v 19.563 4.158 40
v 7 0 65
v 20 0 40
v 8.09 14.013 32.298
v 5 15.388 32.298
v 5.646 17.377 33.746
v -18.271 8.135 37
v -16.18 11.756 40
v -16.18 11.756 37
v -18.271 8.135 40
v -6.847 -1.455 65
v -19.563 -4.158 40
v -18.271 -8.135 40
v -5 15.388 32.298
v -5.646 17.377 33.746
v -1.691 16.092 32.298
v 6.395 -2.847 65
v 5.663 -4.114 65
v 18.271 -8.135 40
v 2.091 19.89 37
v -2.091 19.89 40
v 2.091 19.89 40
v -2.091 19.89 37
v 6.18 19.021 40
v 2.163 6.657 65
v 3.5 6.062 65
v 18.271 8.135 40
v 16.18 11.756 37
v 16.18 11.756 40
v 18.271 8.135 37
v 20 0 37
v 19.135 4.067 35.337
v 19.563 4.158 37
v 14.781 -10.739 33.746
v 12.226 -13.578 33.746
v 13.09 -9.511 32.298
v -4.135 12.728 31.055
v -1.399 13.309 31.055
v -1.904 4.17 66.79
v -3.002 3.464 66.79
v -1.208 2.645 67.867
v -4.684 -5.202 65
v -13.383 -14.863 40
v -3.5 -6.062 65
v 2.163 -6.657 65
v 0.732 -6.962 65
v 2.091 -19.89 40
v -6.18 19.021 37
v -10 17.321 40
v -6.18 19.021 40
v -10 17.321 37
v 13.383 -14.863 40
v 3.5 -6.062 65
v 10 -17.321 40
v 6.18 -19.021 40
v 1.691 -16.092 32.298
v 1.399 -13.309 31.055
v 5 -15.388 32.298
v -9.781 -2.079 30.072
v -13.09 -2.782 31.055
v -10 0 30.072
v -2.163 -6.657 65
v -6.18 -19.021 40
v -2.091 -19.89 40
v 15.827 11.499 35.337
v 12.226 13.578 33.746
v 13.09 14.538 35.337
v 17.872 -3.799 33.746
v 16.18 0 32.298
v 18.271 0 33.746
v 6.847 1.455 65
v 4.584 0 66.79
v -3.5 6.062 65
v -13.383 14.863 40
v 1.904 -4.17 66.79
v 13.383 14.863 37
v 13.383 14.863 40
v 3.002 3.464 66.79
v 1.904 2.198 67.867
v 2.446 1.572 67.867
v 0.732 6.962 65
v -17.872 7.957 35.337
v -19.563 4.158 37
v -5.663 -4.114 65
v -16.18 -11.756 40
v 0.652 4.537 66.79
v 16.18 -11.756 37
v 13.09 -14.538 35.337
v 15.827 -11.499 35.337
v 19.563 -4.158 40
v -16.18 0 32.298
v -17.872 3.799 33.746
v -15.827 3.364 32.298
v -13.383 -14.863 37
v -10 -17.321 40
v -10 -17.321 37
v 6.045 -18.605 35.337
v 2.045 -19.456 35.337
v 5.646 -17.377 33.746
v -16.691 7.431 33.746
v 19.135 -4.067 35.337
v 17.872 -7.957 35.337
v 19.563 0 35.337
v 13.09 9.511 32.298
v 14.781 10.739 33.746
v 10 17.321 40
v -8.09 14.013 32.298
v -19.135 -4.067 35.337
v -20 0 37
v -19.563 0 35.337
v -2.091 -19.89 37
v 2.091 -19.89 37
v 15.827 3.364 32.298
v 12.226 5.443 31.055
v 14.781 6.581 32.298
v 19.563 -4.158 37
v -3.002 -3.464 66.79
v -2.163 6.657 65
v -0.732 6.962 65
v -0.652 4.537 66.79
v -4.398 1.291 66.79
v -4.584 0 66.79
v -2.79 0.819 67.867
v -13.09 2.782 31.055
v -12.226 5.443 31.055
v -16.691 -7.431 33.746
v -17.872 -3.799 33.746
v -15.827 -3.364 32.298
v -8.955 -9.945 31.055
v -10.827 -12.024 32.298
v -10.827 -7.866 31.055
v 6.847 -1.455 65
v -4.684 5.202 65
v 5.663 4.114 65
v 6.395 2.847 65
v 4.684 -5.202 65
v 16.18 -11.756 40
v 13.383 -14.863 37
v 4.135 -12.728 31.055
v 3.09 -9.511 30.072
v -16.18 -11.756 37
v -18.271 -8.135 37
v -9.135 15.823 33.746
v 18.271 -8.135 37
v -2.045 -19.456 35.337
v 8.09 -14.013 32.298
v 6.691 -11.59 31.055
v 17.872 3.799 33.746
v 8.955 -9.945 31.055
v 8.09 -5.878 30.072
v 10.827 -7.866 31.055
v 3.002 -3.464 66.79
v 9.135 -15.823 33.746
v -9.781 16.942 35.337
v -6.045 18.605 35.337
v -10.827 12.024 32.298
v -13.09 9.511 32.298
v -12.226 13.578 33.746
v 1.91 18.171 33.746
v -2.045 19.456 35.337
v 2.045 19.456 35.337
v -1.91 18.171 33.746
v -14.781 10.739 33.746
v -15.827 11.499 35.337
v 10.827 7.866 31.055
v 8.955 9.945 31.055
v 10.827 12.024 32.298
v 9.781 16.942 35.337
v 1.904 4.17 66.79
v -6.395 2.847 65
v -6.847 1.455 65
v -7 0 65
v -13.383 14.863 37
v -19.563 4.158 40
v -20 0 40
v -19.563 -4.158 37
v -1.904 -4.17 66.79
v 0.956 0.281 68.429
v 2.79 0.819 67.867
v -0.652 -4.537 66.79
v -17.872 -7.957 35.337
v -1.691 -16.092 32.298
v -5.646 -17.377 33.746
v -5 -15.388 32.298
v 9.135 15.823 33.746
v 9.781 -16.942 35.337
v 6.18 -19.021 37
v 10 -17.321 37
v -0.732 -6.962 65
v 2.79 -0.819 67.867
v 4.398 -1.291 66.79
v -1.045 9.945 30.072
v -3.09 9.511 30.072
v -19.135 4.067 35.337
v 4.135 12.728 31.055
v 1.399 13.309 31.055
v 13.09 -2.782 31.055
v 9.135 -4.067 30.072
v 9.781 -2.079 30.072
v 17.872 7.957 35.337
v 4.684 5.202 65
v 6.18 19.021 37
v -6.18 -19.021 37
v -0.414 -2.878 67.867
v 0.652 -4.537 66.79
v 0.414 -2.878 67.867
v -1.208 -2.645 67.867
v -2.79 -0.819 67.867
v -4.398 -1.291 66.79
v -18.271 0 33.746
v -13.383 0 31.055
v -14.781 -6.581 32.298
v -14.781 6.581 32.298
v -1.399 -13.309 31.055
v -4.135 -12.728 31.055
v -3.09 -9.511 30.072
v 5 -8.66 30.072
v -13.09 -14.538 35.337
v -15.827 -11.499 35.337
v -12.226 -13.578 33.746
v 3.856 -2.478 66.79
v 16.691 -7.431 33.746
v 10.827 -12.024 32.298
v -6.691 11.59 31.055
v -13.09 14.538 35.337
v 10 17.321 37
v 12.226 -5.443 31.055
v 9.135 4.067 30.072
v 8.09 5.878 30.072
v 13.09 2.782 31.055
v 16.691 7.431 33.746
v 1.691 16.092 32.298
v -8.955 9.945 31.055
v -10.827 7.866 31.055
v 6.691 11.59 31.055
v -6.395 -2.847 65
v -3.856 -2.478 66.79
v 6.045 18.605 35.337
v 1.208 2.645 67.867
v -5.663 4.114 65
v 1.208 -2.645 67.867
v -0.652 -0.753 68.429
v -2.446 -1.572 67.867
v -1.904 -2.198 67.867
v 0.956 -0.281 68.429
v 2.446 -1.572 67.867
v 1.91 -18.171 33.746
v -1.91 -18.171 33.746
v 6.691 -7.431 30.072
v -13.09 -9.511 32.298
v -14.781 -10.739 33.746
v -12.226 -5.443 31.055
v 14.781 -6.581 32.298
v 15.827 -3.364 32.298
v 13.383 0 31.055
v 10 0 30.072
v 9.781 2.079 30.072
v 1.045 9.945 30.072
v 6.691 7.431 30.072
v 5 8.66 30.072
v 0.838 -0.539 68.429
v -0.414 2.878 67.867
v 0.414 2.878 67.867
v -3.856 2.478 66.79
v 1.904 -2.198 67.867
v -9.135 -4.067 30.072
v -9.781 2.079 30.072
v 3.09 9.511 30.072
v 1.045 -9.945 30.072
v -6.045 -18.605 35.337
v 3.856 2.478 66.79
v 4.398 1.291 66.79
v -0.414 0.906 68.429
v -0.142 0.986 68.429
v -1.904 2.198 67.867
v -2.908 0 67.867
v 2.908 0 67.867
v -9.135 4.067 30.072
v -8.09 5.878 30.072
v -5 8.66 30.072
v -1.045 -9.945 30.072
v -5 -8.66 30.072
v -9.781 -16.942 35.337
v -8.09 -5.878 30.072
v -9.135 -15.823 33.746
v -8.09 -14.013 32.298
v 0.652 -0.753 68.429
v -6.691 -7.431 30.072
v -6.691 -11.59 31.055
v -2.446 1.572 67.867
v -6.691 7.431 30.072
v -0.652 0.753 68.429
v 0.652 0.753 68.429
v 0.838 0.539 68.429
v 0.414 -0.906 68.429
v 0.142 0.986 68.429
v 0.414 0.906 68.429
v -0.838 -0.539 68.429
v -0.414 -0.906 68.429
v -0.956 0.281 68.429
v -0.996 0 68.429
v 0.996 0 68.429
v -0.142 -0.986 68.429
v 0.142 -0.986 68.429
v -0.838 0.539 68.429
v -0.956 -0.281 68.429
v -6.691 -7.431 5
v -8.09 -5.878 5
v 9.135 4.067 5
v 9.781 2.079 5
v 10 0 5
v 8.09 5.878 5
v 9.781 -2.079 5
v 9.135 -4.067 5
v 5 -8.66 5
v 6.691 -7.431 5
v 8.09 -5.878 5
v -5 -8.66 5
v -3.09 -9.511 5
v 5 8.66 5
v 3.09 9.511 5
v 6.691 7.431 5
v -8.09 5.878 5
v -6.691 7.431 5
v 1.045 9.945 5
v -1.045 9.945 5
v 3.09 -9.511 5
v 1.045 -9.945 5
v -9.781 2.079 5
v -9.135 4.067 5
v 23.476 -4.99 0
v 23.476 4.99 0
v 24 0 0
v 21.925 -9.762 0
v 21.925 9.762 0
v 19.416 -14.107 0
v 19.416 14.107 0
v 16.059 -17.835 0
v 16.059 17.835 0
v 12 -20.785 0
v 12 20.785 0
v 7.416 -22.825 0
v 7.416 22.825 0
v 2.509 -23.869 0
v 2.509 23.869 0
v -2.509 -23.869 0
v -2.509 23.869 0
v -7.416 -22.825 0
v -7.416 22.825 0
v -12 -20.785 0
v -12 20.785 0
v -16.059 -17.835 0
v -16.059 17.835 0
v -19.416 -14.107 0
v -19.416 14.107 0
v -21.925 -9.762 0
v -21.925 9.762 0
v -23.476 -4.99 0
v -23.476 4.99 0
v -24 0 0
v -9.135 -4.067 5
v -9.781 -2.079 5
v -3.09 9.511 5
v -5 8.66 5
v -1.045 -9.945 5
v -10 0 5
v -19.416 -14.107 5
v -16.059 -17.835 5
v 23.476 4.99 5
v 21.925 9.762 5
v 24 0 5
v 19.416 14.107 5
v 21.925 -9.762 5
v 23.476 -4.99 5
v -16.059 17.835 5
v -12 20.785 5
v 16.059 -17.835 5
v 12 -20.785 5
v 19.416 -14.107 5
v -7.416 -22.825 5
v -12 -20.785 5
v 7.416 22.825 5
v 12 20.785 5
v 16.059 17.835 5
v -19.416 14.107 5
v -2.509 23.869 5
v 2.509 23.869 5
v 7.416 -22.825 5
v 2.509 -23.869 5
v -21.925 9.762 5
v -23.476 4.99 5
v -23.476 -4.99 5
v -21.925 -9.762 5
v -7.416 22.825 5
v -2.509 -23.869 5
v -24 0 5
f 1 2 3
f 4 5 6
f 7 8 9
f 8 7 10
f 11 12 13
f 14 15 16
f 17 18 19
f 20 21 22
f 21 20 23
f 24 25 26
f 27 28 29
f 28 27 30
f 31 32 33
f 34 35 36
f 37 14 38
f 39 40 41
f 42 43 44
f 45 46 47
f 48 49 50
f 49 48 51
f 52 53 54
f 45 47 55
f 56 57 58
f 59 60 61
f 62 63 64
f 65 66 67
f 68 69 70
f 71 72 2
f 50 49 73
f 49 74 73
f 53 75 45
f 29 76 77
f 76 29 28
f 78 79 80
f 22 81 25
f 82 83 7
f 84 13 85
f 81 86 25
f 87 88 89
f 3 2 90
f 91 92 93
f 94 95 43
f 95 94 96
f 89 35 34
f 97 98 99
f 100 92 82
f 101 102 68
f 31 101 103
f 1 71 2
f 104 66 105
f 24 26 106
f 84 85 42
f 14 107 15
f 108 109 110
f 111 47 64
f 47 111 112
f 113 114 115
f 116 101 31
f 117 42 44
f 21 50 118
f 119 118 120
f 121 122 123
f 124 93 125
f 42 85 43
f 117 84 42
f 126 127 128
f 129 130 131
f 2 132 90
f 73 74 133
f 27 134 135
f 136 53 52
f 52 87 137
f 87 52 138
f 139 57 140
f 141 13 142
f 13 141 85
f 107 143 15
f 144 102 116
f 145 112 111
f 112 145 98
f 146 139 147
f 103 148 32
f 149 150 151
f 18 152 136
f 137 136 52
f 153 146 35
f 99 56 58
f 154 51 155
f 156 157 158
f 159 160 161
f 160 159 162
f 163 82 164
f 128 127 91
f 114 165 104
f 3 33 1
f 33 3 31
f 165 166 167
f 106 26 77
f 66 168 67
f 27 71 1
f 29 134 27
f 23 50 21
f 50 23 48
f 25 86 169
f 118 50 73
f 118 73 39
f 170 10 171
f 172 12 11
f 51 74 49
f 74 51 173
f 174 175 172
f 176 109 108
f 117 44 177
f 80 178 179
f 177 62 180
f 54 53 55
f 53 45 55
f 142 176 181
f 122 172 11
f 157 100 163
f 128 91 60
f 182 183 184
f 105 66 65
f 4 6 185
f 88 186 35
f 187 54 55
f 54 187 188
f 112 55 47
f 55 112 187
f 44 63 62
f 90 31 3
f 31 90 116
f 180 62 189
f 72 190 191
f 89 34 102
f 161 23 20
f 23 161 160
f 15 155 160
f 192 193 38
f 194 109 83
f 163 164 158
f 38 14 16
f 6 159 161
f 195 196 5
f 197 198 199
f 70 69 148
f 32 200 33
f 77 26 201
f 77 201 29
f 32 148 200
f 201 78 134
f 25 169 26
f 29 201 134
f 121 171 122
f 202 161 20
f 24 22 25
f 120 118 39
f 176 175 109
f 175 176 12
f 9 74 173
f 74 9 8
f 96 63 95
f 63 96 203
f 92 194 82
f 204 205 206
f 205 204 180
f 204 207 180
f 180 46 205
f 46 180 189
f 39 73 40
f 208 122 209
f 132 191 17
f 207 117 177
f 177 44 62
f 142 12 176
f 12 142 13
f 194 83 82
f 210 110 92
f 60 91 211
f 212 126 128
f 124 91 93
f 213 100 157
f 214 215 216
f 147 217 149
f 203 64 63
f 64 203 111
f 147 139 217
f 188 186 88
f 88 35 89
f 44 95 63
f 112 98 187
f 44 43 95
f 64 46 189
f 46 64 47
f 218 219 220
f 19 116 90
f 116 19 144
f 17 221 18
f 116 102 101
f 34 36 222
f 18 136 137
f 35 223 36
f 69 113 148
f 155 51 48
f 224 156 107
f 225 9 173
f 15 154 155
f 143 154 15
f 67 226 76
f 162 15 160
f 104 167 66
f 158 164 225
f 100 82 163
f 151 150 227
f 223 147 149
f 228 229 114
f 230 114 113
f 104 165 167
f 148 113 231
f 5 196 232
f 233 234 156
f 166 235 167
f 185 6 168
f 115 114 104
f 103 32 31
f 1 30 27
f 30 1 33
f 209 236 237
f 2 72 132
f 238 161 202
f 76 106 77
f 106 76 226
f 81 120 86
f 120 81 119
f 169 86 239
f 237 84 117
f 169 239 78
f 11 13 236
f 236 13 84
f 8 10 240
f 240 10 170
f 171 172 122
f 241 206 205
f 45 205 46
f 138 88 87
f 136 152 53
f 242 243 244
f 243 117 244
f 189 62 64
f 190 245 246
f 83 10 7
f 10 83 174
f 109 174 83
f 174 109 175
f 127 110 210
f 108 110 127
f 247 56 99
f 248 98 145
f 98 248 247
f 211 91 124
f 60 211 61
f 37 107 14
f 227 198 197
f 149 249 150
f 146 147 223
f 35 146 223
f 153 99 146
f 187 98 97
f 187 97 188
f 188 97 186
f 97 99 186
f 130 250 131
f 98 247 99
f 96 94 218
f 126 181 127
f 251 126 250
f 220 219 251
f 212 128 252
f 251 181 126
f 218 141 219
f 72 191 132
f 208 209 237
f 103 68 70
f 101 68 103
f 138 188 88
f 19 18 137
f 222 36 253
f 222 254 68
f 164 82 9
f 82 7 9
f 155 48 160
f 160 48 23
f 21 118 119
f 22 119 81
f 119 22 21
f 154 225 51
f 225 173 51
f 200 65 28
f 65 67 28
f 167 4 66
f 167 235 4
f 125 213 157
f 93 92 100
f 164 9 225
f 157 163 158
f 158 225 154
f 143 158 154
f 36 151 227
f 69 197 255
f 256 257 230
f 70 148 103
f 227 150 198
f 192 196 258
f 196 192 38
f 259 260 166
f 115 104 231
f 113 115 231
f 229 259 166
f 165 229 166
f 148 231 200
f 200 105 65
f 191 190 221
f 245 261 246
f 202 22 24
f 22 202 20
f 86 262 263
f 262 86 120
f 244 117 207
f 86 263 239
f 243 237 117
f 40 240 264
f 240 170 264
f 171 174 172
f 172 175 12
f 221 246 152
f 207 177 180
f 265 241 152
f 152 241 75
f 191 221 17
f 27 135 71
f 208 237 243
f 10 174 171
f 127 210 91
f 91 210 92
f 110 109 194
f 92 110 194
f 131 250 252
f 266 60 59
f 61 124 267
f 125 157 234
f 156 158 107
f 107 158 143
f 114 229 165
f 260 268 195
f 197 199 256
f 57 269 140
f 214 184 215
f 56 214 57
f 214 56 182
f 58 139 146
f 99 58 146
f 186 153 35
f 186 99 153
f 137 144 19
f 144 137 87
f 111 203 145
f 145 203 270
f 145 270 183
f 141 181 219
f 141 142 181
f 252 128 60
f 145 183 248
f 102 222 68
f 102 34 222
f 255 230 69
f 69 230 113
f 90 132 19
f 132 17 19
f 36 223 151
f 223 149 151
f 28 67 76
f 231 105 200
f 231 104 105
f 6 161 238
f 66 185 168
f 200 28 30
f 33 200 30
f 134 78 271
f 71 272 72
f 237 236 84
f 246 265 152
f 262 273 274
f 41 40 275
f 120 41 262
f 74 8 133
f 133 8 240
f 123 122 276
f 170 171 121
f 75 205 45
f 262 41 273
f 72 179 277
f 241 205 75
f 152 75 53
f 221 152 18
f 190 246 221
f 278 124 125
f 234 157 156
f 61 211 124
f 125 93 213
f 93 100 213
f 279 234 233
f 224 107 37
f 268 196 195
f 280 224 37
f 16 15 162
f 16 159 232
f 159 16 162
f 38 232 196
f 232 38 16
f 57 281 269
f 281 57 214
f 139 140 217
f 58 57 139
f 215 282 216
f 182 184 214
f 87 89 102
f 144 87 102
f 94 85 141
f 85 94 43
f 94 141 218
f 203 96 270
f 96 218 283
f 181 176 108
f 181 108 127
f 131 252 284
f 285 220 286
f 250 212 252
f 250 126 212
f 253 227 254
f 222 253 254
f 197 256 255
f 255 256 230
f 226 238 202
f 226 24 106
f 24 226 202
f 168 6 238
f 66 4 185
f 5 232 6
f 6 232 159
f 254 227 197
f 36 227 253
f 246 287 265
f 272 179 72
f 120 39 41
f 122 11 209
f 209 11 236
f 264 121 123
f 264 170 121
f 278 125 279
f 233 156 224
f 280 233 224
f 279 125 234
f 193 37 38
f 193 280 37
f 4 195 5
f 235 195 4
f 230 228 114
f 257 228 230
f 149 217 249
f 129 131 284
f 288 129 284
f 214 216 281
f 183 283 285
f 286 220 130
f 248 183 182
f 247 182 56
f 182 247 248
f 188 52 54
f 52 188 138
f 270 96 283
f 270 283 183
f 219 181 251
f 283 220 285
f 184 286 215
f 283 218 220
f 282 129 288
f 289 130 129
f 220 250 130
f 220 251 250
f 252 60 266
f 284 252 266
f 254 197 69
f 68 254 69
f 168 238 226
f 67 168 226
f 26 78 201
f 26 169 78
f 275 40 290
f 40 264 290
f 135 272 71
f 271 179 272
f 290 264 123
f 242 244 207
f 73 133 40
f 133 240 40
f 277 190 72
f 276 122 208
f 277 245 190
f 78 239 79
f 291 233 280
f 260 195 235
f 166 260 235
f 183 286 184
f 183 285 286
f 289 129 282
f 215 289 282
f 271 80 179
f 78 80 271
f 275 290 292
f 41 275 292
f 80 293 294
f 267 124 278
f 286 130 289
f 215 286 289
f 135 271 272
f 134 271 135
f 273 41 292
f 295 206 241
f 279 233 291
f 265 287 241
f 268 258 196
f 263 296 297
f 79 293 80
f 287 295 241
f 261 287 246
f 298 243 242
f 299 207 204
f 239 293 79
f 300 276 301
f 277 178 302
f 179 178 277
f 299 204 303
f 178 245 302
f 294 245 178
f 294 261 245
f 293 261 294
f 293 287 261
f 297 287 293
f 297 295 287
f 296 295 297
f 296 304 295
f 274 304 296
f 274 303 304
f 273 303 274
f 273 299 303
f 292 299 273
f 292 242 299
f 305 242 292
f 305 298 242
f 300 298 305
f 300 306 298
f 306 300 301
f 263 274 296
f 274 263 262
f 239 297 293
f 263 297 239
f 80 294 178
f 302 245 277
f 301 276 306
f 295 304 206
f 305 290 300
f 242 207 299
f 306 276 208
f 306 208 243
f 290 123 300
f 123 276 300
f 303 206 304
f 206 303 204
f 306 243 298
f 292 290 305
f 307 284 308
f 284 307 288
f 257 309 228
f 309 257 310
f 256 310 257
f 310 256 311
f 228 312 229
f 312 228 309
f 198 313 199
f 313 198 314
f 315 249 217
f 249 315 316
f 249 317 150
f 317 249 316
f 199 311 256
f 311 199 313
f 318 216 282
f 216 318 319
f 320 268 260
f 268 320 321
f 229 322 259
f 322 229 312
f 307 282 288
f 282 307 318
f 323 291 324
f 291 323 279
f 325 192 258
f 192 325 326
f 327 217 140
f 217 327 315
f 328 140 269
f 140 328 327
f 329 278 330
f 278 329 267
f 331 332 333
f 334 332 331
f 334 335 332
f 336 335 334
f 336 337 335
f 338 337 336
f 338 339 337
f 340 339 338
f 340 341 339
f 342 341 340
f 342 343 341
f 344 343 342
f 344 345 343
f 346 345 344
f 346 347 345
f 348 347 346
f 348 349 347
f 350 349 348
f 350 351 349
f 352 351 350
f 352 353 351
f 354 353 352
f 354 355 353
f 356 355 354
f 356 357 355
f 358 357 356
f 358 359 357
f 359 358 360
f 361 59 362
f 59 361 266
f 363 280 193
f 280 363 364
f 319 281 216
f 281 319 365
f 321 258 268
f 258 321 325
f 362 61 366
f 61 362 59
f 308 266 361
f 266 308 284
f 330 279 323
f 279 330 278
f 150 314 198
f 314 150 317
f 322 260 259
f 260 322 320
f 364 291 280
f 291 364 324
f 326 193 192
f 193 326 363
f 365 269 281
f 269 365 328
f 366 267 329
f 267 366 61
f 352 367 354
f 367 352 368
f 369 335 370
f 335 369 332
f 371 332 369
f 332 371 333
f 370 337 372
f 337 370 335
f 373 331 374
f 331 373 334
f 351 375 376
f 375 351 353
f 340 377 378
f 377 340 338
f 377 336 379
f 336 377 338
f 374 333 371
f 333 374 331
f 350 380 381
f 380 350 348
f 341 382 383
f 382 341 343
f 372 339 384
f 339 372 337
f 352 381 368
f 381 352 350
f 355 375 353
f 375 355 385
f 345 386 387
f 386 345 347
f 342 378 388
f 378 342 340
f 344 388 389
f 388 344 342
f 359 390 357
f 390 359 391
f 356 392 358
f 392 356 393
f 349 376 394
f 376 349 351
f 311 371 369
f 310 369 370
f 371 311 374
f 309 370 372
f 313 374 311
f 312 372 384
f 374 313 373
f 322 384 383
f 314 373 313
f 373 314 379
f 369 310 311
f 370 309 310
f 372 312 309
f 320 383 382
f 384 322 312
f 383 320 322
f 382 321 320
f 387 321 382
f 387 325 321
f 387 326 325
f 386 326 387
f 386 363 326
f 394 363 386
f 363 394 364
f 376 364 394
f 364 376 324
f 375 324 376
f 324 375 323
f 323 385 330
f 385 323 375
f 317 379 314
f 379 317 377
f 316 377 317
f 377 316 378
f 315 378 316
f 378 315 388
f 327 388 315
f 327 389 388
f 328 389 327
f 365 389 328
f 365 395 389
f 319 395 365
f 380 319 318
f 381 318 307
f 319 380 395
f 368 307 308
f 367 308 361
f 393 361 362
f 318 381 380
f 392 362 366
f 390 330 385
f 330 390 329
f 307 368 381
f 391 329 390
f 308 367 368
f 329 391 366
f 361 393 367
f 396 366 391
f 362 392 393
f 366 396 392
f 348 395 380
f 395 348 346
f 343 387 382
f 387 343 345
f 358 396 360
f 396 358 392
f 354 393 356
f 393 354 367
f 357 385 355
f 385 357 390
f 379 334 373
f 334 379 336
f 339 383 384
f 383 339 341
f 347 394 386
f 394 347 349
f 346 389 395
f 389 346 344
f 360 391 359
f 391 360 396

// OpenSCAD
//Diameter of head (widest part)
headWidth = 20;

//Height of head (determines taper)
headHeight = 25;

//Length of neck (thin part after head)
neckLength = 40;

//Diameter of neck (thin part after head)
neckWidth = 10;

//Don't edit below this line!


baseWidth = max(1.5*neckWidth, 1.2*headWidth);
baseHeight = 5;

headTop = min(7, headWidth/2);

hull()
{
	translate([0, 0, neckLength])
	{
		cylinder(h = headHeight, r1 = headWidth, r2 = headTop, center = false);
	}
	translate([0, 0, neckLength + headHeight-(headTop/2)])
	{
		sphere(headTop);
	}
	translate([0,0,neckLength - 3])
	{
		scale([1, 1, 0.4])
		{
			sphere(headWidth);
		}
	}
}

cylinder(h = neckLength, r1 = neckWidth, r2 = neckWidth, center = false);
cylinder(h = baseHeight, r1 = baseWidth, r2 = baseWidth, center = false);
